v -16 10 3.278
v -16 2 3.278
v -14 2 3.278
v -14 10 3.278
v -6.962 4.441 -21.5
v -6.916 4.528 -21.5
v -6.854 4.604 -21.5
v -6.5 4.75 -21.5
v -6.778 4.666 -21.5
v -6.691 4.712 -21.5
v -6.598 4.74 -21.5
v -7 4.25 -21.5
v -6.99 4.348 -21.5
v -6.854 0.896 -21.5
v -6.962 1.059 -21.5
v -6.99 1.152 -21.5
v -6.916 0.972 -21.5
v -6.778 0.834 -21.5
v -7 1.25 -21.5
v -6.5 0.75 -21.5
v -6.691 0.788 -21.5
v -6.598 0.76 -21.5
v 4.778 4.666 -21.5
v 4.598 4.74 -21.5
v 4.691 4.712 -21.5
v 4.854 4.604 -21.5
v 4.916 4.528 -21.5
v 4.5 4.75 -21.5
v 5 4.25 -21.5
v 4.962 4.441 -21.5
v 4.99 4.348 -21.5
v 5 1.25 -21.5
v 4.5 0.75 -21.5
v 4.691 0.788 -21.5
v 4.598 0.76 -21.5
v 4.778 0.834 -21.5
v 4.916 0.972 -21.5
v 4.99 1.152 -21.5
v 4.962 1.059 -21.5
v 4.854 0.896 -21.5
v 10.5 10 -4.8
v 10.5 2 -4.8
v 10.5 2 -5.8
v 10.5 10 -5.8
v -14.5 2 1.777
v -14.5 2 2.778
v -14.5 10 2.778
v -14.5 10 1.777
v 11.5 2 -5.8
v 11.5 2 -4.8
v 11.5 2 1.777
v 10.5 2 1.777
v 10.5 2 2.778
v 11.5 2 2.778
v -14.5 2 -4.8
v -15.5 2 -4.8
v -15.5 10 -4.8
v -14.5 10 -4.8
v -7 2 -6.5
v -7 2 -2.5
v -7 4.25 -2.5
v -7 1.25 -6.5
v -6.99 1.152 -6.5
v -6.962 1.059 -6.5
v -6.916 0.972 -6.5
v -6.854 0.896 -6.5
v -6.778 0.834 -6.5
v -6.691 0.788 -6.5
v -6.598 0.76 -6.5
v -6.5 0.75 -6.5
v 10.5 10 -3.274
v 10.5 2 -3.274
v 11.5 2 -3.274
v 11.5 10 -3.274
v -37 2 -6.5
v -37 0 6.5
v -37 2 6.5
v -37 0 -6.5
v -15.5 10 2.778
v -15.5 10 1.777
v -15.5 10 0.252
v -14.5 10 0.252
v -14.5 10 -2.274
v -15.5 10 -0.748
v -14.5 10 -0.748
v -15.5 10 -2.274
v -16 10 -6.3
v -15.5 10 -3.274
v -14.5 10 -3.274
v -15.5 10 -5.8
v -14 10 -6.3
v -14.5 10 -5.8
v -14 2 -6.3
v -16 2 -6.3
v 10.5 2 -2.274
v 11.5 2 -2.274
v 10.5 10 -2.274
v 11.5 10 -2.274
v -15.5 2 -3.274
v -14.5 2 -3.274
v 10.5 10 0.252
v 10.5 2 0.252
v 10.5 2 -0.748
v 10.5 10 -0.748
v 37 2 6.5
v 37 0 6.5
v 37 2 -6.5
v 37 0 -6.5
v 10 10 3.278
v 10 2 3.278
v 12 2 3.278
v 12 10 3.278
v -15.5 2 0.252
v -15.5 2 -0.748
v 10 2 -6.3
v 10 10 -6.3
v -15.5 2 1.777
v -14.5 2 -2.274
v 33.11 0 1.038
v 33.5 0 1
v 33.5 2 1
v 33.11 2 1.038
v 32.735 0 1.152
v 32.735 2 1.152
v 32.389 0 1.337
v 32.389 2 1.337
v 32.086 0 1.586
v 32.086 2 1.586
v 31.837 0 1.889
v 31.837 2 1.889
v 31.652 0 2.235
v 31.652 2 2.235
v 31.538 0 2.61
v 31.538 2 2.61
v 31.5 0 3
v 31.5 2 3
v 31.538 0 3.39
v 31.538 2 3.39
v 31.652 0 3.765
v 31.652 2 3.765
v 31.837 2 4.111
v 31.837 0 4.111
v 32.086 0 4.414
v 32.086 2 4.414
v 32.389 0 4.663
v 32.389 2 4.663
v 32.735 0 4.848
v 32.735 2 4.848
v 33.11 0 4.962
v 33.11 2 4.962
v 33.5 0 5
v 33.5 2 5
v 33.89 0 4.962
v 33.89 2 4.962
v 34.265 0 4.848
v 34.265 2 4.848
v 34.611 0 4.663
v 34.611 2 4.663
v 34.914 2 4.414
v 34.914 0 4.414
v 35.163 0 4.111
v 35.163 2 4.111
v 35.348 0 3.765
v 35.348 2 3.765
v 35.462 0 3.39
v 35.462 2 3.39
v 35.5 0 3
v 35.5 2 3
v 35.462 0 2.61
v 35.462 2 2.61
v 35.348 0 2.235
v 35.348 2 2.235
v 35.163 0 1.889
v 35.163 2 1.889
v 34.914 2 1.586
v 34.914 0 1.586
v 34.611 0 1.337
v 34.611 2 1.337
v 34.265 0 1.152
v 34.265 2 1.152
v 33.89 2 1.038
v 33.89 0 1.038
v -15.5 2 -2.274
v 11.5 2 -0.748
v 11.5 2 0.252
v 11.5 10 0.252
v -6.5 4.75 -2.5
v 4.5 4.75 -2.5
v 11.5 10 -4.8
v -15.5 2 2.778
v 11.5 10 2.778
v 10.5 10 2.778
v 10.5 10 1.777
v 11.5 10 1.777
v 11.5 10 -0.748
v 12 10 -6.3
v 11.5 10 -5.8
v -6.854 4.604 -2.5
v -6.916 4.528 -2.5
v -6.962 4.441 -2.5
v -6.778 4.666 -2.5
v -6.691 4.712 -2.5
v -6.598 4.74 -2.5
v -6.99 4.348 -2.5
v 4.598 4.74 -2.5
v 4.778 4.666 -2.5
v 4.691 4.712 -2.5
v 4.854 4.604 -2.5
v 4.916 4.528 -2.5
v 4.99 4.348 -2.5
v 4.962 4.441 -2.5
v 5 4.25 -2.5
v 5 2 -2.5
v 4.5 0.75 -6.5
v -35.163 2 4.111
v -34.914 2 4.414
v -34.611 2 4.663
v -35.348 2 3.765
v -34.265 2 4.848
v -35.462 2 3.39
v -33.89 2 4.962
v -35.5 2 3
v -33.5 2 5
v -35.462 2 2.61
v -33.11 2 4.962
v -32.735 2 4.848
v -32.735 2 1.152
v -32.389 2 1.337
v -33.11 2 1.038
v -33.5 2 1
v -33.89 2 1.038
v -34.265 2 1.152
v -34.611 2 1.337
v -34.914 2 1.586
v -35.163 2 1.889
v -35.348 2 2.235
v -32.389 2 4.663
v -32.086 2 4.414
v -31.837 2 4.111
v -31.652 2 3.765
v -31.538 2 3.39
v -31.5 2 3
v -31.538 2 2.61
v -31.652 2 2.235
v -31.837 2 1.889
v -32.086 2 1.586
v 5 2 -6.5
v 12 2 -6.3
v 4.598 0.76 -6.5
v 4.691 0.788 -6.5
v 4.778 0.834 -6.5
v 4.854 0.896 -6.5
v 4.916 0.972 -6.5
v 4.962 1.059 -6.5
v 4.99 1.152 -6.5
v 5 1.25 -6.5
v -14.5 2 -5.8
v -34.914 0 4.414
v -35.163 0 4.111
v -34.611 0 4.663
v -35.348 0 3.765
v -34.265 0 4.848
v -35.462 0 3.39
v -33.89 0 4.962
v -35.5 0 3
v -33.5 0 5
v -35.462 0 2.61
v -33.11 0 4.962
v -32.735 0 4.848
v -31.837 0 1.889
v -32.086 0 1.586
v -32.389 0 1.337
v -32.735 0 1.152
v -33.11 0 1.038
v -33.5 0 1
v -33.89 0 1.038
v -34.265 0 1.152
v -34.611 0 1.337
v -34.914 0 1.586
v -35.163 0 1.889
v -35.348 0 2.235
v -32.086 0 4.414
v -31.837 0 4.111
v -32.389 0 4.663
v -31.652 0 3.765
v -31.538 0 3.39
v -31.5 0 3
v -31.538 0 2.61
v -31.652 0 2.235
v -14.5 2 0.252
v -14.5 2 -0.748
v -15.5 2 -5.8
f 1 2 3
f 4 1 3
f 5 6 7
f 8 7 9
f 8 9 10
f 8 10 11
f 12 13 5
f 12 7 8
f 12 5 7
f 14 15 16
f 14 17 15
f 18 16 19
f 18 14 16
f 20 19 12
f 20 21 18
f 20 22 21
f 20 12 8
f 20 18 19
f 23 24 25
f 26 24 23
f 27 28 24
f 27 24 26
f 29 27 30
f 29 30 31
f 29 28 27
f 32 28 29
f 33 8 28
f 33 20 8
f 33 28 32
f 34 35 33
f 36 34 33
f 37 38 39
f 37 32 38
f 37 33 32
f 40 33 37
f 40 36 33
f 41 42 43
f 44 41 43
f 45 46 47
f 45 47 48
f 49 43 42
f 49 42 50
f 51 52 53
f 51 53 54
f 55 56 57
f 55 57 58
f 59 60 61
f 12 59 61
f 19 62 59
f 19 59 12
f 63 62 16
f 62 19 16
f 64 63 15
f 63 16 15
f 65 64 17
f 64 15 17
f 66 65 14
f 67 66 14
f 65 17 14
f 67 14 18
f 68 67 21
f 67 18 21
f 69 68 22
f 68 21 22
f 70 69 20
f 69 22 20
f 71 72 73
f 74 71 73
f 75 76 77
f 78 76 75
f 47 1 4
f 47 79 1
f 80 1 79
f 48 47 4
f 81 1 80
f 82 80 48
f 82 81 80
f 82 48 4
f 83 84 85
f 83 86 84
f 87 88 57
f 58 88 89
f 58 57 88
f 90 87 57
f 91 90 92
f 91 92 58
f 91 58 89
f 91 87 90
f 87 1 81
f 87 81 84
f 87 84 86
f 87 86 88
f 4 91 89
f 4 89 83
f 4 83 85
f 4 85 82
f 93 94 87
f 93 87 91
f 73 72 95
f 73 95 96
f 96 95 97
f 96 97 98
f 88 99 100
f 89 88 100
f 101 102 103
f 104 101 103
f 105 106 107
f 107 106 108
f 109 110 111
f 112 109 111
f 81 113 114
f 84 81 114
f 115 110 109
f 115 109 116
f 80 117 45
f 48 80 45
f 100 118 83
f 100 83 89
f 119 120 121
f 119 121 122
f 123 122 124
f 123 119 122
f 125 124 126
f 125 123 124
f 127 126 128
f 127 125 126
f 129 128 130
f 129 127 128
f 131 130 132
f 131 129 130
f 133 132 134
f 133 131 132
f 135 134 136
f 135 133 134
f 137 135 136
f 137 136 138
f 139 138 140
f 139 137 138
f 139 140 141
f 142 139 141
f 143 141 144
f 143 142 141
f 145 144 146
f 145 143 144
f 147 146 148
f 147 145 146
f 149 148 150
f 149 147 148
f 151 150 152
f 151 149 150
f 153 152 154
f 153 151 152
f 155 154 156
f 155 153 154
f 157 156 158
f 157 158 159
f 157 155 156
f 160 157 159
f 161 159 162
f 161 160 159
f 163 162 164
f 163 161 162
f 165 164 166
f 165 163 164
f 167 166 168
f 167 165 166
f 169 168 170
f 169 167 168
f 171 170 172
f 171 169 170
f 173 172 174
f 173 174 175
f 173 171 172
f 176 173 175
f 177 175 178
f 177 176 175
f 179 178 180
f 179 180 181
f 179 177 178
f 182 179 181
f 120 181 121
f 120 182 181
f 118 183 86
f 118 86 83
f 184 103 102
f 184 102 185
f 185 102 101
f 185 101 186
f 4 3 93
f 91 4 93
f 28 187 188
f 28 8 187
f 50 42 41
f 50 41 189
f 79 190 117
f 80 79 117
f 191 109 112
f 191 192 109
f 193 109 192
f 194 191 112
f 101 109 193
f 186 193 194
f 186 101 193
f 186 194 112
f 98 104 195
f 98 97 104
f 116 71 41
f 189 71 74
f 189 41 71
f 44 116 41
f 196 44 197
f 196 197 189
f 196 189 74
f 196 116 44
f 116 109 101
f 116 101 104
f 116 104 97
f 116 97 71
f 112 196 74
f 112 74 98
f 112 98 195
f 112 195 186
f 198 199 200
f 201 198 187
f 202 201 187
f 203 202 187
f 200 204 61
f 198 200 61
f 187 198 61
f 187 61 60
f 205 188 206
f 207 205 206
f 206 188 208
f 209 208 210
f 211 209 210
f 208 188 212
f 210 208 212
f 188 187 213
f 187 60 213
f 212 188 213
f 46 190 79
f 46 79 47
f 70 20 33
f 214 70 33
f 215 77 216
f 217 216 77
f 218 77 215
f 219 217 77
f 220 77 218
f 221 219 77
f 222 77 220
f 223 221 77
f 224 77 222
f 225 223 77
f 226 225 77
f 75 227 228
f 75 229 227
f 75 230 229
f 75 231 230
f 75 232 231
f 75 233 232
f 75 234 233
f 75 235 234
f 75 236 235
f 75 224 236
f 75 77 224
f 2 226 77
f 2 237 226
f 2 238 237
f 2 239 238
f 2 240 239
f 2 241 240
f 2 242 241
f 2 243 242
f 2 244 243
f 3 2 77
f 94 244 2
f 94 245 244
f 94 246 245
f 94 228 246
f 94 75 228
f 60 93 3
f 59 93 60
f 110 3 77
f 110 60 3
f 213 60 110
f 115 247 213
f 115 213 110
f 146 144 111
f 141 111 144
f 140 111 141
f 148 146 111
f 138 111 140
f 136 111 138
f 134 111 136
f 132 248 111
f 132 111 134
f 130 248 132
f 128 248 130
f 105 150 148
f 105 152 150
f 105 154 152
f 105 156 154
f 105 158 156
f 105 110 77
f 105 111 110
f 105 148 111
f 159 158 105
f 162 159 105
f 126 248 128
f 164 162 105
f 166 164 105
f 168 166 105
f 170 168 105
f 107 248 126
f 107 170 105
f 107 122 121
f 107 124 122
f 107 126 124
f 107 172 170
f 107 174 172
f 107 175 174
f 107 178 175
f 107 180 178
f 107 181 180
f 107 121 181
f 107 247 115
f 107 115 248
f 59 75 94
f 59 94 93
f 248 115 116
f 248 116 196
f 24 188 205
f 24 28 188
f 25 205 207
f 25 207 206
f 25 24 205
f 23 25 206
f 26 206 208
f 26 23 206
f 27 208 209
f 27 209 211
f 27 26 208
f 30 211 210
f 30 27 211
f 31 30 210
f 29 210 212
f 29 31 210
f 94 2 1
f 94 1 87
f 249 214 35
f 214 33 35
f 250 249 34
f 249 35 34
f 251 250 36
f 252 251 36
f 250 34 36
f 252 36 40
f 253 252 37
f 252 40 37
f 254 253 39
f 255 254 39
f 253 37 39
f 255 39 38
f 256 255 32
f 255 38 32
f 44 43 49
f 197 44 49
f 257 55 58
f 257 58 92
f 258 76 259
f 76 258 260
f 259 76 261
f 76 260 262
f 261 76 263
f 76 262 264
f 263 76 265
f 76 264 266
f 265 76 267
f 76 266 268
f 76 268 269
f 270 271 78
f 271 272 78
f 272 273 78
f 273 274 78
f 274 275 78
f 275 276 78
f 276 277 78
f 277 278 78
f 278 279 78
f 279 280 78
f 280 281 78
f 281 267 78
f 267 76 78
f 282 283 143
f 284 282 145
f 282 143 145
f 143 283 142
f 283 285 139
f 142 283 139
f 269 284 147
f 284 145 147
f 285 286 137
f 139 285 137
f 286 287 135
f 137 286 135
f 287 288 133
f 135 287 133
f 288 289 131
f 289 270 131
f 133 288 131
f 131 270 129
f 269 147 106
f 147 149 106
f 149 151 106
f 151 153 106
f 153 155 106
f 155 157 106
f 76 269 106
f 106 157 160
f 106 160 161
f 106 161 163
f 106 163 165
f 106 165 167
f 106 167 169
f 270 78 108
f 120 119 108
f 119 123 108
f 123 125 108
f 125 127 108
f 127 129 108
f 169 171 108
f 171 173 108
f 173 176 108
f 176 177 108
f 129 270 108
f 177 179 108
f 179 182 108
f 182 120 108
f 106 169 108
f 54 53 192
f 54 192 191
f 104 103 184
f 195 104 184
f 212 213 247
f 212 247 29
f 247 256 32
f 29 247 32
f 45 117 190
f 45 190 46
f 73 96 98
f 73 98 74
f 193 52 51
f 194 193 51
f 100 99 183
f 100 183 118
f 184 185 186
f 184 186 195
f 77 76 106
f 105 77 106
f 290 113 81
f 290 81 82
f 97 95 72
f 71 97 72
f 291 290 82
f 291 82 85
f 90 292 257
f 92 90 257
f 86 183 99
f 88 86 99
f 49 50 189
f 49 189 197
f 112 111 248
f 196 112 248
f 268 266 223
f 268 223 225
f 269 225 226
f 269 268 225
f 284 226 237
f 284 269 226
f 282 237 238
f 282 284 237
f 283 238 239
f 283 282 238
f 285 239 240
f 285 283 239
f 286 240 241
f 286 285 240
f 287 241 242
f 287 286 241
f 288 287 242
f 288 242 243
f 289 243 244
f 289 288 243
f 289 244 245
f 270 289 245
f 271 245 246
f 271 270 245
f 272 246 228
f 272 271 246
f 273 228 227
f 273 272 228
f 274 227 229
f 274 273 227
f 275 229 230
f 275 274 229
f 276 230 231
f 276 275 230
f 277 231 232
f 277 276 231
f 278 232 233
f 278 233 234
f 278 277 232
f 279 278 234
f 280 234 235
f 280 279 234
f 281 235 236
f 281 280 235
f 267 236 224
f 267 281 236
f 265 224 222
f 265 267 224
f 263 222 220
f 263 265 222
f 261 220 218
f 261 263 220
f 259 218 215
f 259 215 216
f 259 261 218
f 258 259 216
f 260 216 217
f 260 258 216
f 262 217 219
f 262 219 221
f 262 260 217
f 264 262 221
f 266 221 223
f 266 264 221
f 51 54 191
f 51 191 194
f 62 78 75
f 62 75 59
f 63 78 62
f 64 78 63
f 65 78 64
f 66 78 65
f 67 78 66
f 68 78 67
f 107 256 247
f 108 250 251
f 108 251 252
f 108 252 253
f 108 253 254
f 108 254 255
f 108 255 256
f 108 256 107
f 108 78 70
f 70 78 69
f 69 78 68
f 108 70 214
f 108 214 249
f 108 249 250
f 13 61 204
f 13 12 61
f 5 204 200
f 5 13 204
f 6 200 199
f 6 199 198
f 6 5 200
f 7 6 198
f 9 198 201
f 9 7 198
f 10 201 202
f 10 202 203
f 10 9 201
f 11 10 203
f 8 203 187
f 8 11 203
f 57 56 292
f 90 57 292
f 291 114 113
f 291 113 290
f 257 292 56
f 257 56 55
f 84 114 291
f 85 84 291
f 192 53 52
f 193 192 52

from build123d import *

# Parameters (mm, degrees)
SKETCH1_W           = 74
SKETCH1_H           = 13
SKETCH1_R           = 2
BOSS_EXTRUDE1_DEPTH = 2
SKETCH2_W           = 2
SKETCH2_H           = 9.5775
SKETCH2_W_2         = 1
SKETCH2_H_2         = 1
BOSS_EXTRUDE2_DEPTH = 8
SKETCH3_W           = 12
SKETCH3_H           = 19
BOSS_EXTRUDE3_DEPTH = 4
FILLET1_R           = 0.5


with BuildPart() as part:
    # Sketch1 → Boss-Extrude1 (new body)
    with BuildSketch(Plane(origin=(0, 0, 0), x_dir=(1, 0, 0), z_dir=(0, 1, 0))):
        Rectangle(SKETCH1_W, SKETCH1_H)
        with Locations(Location((-33.5, -3, 0), (0, 0, 270))):
            Circle(SKETCH1_R, mode=Mode.SUBTRACT)
        with Locations(Location((33.5, -3, 0), (0, 0, 90))):
            Circle(SKETCH1_R, mode=Mode.SUBTRACT)
    extrude(amount=BOSS_EXTRUDE1_DEPTH)

    # Sketch2 → Boss-Extrude2 (add)
    # profile 1 of 2: a face of its own
    with BuildSketch(Plane(origin=(0, 2, 0), x_dir=(1, 0, 0), z_dir=(0, 1, 0))):
        with Locations((11, 1.51125)):
            Rectangle(SKETCH2_W, SKETCH2_H)
        with Locations((11, 2.774166667)):
            Rectangle(SKETCH2_W_2, SKETCH2_H_2, mode=Mode.SUBTRACT)
        with Locations((11, 5.3)):
            Rectangle(SKETCH2_W_2, SKETCH2_H_2, mode=Mode.SUBTRACT)
        with Locations((11, 0.248333333)):
            Rectangle(SKETCH2_W_2, SKETCH2_H_2, mode=Mode.SUBTRACT)
        with Locations((11, -2.2775)):
            Rectangle(SKETCH2_W_2, SKETCH2_H_2, mode=Mode.SUBTRACT)
    # profile 2 of 2: a face of its own
    with BuildSketch(Plane(origin=(0, 2, 0), x_dir=(1, 0, 0), z_dir=(0, 1, 0))):
        with Locations((-15, 1.51125)):
            Rectangle(SKETCH2_W, SKETCH2_H)
        with Locations((-15, -2.2775)):
            Rectangle(SKETCH2_W_2, SKETCH2_H_2, mode=Mode.SUBTRACT)
        with Locations((-15, 0.248333333)):
            Rectangle(SKETCH2_W_2, SKETCH2_H_2, mode=Mode.SUBTRACT)
        with Locations((-15, 2.774166667)):
            Rectangle(SKETCH2_W_2, SKETCH2_H_2, mode=Mode.SUBTRACT)
        with Locations((-15, 5.3)):
            Rectangle(SKETCH2_W_2, SKETCH2_H_2, mode=Mode.SUBTRACT)
    extrude(amount=BOSS_EXTRUDE2_DEPTH)

    # Sketch3 → Boss-Extrude3 (add)
    with BuildSketch(Plane(origin=(0, 0.75, 0), x_dir=(1, 0, 0), z_dir=(0, 1, 0))):
        with Locations((-1, 12)):
            Rectangle(SKETCH3_W, SKETCH3_H)
    extrude(amount=BOSS_EXTRUDE3_DEPTH)

    # Fillet1
    fillet1_edges = [part.edges().sort_by_distance(p)[0] for p in [
        (5, 0.75, -14),
        (-7, 0.75, -14),
        (5, 4.75, -12),
        (-7, 4.75, -12),
    ]]
    fillet(fillet1_edges, radius=FILLET1_R)


solid = part.part
